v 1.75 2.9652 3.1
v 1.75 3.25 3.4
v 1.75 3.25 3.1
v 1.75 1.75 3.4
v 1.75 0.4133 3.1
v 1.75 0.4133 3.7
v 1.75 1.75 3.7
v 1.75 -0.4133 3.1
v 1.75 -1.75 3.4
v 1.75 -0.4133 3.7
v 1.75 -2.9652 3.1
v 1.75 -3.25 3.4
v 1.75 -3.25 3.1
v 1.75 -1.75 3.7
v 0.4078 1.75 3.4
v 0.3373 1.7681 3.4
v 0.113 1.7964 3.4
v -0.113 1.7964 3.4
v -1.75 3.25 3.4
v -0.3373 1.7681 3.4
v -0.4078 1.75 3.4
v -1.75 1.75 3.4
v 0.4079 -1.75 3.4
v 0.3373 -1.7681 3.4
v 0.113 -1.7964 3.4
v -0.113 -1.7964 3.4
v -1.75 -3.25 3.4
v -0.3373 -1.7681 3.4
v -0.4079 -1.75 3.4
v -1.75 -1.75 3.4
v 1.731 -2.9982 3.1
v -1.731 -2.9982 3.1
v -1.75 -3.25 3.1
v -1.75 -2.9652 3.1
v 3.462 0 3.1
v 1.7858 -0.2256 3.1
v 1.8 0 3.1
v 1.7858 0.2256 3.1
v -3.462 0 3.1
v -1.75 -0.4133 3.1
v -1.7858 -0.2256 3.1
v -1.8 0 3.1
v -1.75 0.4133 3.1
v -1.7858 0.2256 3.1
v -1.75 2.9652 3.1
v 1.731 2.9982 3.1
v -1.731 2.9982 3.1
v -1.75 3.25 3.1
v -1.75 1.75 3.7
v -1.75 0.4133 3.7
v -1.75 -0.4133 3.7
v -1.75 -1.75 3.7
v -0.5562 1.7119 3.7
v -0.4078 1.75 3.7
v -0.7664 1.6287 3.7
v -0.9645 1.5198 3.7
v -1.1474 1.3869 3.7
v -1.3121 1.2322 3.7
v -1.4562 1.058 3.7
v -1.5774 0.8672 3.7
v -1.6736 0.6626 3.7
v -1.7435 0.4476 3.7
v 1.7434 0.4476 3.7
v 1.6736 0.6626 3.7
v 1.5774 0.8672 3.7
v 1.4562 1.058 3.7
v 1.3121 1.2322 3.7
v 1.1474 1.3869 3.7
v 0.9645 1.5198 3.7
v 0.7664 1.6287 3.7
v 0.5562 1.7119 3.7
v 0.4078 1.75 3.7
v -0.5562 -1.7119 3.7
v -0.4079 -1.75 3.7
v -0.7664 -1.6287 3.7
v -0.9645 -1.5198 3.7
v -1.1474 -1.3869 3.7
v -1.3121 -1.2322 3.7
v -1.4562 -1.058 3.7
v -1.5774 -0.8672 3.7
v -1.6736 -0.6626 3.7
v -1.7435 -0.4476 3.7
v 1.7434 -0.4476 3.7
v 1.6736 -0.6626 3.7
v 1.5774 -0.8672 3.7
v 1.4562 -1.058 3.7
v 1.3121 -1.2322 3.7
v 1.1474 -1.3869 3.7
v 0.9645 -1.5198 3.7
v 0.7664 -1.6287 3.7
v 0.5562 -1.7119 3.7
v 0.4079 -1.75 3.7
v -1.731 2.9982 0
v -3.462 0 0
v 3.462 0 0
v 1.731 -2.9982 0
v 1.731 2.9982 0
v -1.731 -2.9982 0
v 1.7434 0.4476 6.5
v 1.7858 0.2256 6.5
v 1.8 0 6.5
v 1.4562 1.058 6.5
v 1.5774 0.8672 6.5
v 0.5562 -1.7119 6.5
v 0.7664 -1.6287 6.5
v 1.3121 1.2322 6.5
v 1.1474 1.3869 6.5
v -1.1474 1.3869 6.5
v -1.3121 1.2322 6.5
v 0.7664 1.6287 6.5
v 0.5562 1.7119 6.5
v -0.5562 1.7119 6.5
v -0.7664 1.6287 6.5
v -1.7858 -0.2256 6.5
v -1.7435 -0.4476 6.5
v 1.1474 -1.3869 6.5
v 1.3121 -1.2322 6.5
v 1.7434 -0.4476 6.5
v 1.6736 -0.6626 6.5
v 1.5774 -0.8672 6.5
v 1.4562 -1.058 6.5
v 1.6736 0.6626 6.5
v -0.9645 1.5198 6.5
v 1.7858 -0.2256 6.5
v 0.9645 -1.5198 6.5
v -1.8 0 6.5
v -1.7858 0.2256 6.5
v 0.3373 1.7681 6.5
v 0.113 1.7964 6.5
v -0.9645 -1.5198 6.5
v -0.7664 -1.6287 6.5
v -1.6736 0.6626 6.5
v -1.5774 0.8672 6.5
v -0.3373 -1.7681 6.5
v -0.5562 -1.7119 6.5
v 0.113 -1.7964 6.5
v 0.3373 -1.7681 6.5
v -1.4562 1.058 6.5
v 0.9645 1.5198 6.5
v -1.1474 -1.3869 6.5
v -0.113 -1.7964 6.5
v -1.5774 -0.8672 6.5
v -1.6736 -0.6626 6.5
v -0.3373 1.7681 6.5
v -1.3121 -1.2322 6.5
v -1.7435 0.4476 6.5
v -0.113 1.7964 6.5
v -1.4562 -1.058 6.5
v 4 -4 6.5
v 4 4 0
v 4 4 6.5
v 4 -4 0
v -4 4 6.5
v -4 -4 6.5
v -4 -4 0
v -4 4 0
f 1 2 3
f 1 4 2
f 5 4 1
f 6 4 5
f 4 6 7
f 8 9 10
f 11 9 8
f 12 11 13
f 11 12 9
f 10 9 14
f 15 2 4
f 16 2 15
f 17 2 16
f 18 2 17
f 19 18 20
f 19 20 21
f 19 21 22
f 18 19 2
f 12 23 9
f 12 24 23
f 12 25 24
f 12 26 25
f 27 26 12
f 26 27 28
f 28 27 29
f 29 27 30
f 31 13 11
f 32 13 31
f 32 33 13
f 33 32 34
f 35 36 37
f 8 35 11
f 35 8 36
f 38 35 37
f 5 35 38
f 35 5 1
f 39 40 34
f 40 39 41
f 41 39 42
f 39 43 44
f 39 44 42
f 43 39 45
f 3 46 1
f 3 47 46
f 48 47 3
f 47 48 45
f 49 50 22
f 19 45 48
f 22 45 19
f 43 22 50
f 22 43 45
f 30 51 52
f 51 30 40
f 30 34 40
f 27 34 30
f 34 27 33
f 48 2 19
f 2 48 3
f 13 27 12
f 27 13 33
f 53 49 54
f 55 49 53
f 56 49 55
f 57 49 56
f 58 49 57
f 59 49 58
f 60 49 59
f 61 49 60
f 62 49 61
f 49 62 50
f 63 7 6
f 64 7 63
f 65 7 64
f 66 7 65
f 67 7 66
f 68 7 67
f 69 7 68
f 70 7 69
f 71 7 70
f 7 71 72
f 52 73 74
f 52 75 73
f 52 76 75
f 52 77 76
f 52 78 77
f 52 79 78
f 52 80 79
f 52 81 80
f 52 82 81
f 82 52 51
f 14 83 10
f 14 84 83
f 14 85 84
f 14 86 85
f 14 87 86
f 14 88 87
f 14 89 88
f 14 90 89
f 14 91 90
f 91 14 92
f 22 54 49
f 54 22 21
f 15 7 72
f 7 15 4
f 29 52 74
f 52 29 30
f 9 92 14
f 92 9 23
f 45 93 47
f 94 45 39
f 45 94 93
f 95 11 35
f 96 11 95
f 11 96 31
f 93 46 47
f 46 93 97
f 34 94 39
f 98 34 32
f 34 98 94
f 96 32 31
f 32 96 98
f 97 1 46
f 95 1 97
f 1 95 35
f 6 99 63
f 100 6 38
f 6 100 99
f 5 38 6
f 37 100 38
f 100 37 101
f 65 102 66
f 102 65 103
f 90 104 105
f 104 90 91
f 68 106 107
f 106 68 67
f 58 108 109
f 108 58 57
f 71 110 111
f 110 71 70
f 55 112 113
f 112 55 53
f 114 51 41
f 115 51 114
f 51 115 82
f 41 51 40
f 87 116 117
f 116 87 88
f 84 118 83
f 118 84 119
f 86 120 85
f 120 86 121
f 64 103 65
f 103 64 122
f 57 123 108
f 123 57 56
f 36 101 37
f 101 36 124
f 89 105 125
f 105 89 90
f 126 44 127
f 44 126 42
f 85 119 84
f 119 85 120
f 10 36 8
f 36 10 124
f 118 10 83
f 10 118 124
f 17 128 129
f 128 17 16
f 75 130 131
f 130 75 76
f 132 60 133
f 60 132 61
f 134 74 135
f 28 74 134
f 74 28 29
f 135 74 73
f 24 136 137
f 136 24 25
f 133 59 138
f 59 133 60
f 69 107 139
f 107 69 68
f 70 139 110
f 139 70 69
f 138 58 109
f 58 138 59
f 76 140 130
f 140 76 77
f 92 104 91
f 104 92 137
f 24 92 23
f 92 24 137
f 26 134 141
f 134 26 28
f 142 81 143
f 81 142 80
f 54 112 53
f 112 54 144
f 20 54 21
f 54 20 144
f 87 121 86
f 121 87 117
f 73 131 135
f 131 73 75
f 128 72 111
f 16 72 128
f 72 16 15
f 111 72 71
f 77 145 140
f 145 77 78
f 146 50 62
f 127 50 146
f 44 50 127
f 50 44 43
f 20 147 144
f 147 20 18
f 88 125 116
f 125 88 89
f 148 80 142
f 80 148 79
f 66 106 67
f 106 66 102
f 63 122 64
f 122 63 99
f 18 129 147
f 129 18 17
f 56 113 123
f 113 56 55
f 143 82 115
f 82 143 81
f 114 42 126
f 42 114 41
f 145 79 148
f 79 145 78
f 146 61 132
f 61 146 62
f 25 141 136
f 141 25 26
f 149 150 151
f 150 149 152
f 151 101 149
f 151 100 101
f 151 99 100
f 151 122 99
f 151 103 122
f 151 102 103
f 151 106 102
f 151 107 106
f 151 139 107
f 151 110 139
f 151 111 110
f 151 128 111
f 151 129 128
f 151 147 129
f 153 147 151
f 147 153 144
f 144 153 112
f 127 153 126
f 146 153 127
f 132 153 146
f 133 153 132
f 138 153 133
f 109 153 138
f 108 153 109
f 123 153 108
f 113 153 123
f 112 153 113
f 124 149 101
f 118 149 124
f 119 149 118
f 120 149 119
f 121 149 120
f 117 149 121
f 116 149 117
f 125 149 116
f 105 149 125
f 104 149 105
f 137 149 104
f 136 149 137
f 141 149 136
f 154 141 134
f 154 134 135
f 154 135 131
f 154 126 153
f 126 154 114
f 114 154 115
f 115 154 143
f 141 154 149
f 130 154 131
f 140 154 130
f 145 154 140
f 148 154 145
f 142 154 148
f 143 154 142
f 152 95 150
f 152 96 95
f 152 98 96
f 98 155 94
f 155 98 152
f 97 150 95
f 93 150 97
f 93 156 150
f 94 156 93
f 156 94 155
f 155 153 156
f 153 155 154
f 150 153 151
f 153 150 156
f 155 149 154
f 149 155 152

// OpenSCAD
$fn = 50;

difference() {
	union() {
		translate(v = [-22.5, -7.5, 9.5]) {
			rotate(a = [0, 0, 0]) {
				difference() {
					union() {
						translate(v = [18.5, 3.5, -9.5]) {
							cube(size = [8, 8, 6.5]);
						}
					}
					union() {
						translate(v = [22.5, 7.5, -9.6]) {
							rotate(a = [0, 0, 0]) {
								difference() {
									union() {
										translate(v = [-1.75, -3.25, -0.3]) {
											cube(size = [3.5, 6.5, 0.3]);
										}
										translate(v = [-1.75, -1.75, -0.6]) {
											cube(size = [3.5, 3.5, 0.3]);
										}
										translate(v = [-1.75, -3.25, 3.2]) {
											cube(size = [3.5, 6.5, 0.3]);
										}
										translate(v = [-1.75, -1.75, 3.5]) {
											cube(size = [3.5, 3.5, 0.3]);
										}
										linear_extrude(height = 3.2) {
											polygon(points = [[3.4619999999999997, 0.0], [1.7310000000000003, 2.9981799479017264], [-1.7309999999999992, 2.9981799479017264], [-3.4619999999999997, 4.2397272186481365e-16], [-1.7310000000000014, -2.998179947901726], [1.7309999999999977, -2.9981799479017277]]);
										}
										translate(v = [-1.75, -3.25, -0.3]) {
											cube(size = [3.5, 6.5, 0.3]);
										}
										translate(v = [-1.75, -1.75, -0.6]) {
											cube(size = [3.5, 3.5, 0.3]);
										}
										translate(v = [-1.75, -3.25, 3.2]) {
											cube(size = [3.5, 6.5, 0.3]);
										}
										translate(v = [-1.75, -1.75, 3.5]) {
											cube(size = [3.5, 3.5, 0.3]);
										}
										translate(v = [-1.75, -3.25, -0.3]) {
											cube(size = [3.5, 6.5, 0.3]);
										}
										translate(v = [-1.75, -1.75, -0.6]) {
											cube(size = [3.5, 3.5, 0.3]);
										}
										translate(v = [-1.75, -3.25, 3.2]) {
											cube(size = [3.5, 6.5, 0.3]);
										}
										translate(v = [-1.75, -1.75, 3.5]) {
											cube(size = [3.5, 3.5, 0.3]);
										}
									}
									union();
								}
							}
						}
						translate(v = [22.5, 7.5, -9.6]) {
							cylinder(h = 6.7, r = 1.8);
						}
					}
				}
			}
		}
	}
	union();
}
